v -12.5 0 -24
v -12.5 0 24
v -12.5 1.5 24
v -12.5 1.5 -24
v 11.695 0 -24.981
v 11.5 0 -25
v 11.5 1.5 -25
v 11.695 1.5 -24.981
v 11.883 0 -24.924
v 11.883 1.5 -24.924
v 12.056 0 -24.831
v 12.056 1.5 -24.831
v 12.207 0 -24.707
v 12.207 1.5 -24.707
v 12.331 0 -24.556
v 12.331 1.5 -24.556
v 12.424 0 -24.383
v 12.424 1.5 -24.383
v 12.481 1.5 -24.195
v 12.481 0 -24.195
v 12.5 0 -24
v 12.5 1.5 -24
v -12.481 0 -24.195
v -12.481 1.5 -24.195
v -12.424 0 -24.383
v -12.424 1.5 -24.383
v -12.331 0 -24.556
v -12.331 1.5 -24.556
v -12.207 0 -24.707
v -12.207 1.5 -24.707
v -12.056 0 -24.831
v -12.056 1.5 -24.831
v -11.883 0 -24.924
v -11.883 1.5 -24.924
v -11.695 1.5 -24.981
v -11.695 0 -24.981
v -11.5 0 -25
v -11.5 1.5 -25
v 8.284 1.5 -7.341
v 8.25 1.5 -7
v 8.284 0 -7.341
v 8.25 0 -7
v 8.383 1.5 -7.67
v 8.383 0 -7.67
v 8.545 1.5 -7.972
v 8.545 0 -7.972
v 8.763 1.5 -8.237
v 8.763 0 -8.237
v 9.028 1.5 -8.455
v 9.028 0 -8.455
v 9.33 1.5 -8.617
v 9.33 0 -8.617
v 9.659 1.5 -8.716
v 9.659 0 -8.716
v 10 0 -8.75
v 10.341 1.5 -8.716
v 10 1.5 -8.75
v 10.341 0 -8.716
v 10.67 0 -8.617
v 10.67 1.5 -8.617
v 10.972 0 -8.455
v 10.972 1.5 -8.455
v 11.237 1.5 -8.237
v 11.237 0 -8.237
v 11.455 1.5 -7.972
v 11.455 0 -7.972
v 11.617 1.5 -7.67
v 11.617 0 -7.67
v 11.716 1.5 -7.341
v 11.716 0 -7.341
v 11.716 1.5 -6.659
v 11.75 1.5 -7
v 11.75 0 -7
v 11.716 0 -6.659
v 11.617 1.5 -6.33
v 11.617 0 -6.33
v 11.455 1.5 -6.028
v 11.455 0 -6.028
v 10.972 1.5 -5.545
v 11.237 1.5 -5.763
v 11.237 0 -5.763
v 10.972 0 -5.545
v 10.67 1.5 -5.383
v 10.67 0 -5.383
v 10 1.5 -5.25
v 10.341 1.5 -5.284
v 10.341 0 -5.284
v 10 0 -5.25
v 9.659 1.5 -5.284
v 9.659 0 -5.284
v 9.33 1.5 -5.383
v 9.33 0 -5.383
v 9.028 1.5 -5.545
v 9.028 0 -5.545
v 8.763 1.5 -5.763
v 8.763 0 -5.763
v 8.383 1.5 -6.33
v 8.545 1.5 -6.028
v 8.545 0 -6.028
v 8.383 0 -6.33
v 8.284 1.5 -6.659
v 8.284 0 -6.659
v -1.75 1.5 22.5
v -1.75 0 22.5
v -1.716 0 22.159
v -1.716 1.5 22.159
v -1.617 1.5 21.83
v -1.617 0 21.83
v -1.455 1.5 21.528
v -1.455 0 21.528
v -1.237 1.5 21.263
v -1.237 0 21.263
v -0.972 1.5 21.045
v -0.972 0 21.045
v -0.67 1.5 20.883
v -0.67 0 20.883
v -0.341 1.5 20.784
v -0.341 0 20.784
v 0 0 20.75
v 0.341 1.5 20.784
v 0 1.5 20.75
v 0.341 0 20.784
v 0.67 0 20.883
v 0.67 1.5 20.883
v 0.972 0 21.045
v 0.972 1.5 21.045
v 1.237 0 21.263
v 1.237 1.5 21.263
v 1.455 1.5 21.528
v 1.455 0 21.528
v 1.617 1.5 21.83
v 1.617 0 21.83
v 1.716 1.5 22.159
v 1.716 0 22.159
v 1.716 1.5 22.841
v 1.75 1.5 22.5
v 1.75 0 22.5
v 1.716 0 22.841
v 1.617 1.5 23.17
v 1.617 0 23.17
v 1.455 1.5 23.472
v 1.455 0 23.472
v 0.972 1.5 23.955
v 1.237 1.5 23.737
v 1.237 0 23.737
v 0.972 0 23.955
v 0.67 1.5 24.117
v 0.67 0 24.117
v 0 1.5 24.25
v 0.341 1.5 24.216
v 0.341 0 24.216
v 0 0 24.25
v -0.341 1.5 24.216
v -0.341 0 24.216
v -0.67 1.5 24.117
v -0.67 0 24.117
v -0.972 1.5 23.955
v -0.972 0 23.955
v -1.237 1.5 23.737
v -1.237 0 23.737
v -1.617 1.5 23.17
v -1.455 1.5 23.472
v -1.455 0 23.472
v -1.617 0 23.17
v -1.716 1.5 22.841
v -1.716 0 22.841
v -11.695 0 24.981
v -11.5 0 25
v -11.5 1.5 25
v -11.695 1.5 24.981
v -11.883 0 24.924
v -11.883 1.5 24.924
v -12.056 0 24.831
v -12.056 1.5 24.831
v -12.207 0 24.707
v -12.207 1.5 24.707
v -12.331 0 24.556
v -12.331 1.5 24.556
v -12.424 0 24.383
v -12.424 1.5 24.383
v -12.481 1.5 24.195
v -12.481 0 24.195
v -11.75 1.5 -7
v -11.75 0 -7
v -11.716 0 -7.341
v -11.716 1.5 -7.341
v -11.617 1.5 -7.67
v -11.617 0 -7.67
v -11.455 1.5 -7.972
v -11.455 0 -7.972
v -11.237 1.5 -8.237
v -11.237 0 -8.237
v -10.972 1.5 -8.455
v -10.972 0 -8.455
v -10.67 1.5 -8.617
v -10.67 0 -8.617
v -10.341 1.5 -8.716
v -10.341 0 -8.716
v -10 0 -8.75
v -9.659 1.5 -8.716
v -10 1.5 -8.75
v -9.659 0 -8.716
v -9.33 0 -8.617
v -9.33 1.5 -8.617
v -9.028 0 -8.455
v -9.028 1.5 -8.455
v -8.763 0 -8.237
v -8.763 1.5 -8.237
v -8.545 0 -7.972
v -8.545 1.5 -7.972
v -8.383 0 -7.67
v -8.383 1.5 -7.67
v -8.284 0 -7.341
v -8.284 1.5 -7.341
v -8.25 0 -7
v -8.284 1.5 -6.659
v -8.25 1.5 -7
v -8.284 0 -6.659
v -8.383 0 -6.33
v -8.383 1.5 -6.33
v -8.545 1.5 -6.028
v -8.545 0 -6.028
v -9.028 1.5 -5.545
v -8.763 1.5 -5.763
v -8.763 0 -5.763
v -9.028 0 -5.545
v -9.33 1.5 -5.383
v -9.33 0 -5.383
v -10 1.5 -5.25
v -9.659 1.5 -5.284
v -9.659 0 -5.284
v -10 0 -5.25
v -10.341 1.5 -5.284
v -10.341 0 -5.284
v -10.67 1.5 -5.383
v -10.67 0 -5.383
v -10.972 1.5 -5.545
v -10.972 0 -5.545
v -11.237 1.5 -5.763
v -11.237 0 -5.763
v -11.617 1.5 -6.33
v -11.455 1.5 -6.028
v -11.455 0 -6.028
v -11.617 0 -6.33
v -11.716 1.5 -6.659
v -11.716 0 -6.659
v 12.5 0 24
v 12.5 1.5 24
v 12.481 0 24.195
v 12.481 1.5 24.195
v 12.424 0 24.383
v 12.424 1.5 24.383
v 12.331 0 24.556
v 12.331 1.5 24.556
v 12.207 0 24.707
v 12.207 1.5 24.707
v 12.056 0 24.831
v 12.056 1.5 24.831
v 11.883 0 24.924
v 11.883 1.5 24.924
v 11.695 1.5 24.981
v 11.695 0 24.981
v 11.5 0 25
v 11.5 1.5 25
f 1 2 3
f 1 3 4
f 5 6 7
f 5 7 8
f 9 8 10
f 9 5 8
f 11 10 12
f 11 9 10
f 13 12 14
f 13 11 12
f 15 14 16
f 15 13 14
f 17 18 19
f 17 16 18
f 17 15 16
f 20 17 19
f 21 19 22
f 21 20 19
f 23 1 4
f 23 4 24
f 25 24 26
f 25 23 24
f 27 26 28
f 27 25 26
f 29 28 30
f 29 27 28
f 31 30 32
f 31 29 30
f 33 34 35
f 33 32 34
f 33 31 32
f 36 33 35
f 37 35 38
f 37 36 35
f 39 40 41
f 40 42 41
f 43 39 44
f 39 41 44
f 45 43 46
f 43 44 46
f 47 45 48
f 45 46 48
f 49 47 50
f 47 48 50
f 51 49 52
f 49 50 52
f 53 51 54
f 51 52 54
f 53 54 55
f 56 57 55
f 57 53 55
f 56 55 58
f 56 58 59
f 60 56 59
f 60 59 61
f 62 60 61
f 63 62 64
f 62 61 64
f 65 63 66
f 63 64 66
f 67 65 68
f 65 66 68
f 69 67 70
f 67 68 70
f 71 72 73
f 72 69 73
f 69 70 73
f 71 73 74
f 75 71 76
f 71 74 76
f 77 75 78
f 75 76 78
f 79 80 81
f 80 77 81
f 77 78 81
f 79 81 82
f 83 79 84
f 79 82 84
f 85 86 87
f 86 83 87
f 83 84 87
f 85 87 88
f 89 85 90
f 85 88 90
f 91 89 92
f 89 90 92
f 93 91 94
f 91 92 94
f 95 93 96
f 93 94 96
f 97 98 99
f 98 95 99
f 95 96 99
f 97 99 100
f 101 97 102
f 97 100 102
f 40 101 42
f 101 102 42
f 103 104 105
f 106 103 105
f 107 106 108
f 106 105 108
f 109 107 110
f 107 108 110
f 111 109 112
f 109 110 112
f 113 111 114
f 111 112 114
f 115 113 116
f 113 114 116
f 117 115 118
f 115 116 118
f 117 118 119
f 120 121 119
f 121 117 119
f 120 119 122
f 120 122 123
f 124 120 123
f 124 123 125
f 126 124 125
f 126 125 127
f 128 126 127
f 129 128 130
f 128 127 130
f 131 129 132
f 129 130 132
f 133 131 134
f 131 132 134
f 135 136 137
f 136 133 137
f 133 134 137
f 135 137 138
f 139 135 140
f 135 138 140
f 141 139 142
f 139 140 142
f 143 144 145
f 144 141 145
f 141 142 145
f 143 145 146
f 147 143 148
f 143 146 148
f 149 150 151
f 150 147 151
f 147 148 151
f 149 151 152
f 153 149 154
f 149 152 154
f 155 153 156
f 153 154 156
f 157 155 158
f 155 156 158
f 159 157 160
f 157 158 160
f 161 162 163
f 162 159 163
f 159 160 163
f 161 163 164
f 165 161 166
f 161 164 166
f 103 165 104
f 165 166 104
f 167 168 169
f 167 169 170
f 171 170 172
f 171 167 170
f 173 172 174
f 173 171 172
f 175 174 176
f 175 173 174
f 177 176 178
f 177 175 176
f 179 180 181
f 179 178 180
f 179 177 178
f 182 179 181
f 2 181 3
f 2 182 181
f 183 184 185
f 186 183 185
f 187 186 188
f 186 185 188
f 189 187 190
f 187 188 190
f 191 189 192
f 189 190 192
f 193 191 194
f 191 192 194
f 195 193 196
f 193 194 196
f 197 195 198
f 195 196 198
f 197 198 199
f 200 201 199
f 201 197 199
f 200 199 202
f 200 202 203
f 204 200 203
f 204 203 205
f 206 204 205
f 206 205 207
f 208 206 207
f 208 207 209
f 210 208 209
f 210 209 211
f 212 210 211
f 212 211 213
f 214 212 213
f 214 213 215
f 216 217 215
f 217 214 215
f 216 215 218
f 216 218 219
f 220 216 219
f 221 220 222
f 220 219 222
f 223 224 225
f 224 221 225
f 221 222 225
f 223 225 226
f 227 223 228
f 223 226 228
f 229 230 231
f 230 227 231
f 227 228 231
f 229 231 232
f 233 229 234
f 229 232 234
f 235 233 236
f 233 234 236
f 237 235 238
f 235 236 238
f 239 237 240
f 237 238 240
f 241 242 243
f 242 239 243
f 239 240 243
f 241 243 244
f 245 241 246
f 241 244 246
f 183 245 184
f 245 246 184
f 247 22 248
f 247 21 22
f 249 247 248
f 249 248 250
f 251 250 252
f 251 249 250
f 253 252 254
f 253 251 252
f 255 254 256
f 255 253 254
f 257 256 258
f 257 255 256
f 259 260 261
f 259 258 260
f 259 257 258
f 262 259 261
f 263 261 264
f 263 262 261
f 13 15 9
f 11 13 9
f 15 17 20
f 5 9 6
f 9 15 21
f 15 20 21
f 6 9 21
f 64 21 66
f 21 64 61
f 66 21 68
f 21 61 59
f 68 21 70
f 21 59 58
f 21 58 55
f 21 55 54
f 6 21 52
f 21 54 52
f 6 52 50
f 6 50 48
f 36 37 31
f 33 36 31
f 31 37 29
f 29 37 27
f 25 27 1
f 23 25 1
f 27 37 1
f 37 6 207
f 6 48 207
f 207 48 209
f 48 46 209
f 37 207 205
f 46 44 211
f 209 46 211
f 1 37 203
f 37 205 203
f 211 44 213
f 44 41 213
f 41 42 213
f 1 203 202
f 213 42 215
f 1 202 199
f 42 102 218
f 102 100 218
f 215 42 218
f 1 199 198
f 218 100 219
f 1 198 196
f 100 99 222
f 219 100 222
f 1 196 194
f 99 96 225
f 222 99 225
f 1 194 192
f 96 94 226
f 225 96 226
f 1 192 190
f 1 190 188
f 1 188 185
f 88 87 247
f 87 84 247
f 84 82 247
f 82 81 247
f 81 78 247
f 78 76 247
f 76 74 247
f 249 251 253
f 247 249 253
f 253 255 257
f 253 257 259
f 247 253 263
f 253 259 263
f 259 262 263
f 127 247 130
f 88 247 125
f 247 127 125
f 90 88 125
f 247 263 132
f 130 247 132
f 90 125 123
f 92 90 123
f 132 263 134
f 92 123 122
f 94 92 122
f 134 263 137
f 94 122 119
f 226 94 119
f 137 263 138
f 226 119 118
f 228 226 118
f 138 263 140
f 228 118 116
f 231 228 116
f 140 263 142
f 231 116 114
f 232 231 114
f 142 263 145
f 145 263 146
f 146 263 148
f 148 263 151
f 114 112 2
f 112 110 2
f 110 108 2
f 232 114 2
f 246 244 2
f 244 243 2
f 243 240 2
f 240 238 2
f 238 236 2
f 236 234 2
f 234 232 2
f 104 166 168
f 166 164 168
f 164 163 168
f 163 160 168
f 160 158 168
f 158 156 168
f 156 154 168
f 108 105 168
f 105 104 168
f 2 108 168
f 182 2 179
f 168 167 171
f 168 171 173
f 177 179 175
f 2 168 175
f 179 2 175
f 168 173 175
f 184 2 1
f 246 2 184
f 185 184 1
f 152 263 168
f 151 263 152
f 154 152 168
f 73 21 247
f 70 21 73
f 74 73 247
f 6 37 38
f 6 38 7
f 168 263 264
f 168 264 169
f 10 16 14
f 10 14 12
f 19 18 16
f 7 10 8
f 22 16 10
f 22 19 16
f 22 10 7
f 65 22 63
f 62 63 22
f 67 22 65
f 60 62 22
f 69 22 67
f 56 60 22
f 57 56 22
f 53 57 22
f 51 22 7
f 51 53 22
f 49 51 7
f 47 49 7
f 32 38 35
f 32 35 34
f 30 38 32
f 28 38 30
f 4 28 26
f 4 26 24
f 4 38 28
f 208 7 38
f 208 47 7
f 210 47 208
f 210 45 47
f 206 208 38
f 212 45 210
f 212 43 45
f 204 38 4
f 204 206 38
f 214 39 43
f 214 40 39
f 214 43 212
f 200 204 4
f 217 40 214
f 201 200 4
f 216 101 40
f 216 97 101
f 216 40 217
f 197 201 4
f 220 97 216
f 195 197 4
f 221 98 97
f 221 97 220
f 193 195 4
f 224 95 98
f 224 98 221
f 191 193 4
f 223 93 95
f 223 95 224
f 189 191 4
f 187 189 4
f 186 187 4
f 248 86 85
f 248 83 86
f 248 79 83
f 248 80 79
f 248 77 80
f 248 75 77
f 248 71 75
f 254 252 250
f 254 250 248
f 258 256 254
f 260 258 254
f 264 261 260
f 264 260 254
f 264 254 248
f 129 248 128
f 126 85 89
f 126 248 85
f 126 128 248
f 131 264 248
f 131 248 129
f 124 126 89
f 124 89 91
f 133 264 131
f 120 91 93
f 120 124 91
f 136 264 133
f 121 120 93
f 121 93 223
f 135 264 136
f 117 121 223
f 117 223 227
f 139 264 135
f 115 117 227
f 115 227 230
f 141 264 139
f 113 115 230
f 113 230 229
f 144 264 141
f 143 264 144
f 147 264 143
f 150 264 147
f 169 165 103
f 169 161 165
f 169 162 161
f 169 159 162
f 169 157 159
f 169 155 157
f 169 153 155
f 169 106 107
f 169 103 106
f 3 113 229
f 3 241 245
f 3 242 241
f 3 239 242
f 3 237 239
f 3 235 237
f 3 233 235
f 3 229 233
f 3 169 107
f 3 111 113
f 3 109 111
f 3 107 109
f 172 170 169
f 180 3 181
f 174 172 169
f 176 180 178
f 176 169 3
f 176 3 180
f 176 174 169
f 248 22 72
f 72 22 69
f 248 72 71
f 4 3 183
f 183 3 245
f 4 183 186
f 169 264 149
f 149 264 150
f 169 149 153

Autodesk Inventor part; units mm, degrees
ref_plane "YZ Plane" through (0, 0, 0) normal (1, 0, 0) x (0, 1, 0)
ref_plane "XZ Plane" through (0, 0, 0) normal (0, 1, 0) x (-1, 0, 0)
ref_plane "XY Plane" through (0, 0, 0) normal (0, 0, 1) x (1, 0, 0)
sketch "Esquisse1" plane through (0, 0, 0) normal (0, 1, 0) x (-1, 0, 0)
  line L0 (-11.5, 25) -> (11.5, 25)
  line L1 (12.5, 24) -> (12.5, -24)
  line L2 (11.5, -25) -> (-11.5, -25)
  line L3 (-12.5, -24) -> (-12.5, 24)
  line L4 (-12.5, 25) -> (12.5, -25) construction
  line L5 (12.5, 25) -> (-12.5, -25) construction
  arc A0 (12.5, 24) -> (11.5, 25) centre (11.5, 24) ccw
  arc A1 (-11.5, 25) -> (-12.5, 24) centre (-11.5, 24) ccw
  arc A2 (-12.5, -24) -> (-11.5, -25) centre (-11.5, -24) ccw
  arc A3 (11.5, -25) -> (12.5, -24) centre (11.5, -24) ccw
  line L6 (0, 25) -> (0, 22.5) construction
  circle A4 centre (0, 22.5) radius 1.75
  line L7 (9.4717, 25) -> (9.4717, -7) construction
  line L8 (12.5, -7) -> (10, -7) construction
  circle A5 centre (10, -7) radius 1.75
  circle A6 centre (-10, -7) radius 1.75
  point P0 (0, 0)
  dimension "d0" = 25
  dimension "d1" = 50
  dimension "d2" = 1
  dimension "d3" = 2.5
  dimension "d4" = 3.5
  dimension "d5" = 32
  dimension "d6" = 2.5
  dimension "d7" = 3.5
extrude "Extrusion1" add sketch "Esquisse1" along normal blind 1.5
sketch "Sketch2" plane through (-12.5, 0, -24) normal (-1, 0, 0) x (0, 0, 1)
  point P0 (24, 0)
sketch "Sketch3" plane through (0, 1.5, 0) normal (0, 1, 0) x (1, 0, 0)
  point P0 (0, 0)
properties part number "PCB"
